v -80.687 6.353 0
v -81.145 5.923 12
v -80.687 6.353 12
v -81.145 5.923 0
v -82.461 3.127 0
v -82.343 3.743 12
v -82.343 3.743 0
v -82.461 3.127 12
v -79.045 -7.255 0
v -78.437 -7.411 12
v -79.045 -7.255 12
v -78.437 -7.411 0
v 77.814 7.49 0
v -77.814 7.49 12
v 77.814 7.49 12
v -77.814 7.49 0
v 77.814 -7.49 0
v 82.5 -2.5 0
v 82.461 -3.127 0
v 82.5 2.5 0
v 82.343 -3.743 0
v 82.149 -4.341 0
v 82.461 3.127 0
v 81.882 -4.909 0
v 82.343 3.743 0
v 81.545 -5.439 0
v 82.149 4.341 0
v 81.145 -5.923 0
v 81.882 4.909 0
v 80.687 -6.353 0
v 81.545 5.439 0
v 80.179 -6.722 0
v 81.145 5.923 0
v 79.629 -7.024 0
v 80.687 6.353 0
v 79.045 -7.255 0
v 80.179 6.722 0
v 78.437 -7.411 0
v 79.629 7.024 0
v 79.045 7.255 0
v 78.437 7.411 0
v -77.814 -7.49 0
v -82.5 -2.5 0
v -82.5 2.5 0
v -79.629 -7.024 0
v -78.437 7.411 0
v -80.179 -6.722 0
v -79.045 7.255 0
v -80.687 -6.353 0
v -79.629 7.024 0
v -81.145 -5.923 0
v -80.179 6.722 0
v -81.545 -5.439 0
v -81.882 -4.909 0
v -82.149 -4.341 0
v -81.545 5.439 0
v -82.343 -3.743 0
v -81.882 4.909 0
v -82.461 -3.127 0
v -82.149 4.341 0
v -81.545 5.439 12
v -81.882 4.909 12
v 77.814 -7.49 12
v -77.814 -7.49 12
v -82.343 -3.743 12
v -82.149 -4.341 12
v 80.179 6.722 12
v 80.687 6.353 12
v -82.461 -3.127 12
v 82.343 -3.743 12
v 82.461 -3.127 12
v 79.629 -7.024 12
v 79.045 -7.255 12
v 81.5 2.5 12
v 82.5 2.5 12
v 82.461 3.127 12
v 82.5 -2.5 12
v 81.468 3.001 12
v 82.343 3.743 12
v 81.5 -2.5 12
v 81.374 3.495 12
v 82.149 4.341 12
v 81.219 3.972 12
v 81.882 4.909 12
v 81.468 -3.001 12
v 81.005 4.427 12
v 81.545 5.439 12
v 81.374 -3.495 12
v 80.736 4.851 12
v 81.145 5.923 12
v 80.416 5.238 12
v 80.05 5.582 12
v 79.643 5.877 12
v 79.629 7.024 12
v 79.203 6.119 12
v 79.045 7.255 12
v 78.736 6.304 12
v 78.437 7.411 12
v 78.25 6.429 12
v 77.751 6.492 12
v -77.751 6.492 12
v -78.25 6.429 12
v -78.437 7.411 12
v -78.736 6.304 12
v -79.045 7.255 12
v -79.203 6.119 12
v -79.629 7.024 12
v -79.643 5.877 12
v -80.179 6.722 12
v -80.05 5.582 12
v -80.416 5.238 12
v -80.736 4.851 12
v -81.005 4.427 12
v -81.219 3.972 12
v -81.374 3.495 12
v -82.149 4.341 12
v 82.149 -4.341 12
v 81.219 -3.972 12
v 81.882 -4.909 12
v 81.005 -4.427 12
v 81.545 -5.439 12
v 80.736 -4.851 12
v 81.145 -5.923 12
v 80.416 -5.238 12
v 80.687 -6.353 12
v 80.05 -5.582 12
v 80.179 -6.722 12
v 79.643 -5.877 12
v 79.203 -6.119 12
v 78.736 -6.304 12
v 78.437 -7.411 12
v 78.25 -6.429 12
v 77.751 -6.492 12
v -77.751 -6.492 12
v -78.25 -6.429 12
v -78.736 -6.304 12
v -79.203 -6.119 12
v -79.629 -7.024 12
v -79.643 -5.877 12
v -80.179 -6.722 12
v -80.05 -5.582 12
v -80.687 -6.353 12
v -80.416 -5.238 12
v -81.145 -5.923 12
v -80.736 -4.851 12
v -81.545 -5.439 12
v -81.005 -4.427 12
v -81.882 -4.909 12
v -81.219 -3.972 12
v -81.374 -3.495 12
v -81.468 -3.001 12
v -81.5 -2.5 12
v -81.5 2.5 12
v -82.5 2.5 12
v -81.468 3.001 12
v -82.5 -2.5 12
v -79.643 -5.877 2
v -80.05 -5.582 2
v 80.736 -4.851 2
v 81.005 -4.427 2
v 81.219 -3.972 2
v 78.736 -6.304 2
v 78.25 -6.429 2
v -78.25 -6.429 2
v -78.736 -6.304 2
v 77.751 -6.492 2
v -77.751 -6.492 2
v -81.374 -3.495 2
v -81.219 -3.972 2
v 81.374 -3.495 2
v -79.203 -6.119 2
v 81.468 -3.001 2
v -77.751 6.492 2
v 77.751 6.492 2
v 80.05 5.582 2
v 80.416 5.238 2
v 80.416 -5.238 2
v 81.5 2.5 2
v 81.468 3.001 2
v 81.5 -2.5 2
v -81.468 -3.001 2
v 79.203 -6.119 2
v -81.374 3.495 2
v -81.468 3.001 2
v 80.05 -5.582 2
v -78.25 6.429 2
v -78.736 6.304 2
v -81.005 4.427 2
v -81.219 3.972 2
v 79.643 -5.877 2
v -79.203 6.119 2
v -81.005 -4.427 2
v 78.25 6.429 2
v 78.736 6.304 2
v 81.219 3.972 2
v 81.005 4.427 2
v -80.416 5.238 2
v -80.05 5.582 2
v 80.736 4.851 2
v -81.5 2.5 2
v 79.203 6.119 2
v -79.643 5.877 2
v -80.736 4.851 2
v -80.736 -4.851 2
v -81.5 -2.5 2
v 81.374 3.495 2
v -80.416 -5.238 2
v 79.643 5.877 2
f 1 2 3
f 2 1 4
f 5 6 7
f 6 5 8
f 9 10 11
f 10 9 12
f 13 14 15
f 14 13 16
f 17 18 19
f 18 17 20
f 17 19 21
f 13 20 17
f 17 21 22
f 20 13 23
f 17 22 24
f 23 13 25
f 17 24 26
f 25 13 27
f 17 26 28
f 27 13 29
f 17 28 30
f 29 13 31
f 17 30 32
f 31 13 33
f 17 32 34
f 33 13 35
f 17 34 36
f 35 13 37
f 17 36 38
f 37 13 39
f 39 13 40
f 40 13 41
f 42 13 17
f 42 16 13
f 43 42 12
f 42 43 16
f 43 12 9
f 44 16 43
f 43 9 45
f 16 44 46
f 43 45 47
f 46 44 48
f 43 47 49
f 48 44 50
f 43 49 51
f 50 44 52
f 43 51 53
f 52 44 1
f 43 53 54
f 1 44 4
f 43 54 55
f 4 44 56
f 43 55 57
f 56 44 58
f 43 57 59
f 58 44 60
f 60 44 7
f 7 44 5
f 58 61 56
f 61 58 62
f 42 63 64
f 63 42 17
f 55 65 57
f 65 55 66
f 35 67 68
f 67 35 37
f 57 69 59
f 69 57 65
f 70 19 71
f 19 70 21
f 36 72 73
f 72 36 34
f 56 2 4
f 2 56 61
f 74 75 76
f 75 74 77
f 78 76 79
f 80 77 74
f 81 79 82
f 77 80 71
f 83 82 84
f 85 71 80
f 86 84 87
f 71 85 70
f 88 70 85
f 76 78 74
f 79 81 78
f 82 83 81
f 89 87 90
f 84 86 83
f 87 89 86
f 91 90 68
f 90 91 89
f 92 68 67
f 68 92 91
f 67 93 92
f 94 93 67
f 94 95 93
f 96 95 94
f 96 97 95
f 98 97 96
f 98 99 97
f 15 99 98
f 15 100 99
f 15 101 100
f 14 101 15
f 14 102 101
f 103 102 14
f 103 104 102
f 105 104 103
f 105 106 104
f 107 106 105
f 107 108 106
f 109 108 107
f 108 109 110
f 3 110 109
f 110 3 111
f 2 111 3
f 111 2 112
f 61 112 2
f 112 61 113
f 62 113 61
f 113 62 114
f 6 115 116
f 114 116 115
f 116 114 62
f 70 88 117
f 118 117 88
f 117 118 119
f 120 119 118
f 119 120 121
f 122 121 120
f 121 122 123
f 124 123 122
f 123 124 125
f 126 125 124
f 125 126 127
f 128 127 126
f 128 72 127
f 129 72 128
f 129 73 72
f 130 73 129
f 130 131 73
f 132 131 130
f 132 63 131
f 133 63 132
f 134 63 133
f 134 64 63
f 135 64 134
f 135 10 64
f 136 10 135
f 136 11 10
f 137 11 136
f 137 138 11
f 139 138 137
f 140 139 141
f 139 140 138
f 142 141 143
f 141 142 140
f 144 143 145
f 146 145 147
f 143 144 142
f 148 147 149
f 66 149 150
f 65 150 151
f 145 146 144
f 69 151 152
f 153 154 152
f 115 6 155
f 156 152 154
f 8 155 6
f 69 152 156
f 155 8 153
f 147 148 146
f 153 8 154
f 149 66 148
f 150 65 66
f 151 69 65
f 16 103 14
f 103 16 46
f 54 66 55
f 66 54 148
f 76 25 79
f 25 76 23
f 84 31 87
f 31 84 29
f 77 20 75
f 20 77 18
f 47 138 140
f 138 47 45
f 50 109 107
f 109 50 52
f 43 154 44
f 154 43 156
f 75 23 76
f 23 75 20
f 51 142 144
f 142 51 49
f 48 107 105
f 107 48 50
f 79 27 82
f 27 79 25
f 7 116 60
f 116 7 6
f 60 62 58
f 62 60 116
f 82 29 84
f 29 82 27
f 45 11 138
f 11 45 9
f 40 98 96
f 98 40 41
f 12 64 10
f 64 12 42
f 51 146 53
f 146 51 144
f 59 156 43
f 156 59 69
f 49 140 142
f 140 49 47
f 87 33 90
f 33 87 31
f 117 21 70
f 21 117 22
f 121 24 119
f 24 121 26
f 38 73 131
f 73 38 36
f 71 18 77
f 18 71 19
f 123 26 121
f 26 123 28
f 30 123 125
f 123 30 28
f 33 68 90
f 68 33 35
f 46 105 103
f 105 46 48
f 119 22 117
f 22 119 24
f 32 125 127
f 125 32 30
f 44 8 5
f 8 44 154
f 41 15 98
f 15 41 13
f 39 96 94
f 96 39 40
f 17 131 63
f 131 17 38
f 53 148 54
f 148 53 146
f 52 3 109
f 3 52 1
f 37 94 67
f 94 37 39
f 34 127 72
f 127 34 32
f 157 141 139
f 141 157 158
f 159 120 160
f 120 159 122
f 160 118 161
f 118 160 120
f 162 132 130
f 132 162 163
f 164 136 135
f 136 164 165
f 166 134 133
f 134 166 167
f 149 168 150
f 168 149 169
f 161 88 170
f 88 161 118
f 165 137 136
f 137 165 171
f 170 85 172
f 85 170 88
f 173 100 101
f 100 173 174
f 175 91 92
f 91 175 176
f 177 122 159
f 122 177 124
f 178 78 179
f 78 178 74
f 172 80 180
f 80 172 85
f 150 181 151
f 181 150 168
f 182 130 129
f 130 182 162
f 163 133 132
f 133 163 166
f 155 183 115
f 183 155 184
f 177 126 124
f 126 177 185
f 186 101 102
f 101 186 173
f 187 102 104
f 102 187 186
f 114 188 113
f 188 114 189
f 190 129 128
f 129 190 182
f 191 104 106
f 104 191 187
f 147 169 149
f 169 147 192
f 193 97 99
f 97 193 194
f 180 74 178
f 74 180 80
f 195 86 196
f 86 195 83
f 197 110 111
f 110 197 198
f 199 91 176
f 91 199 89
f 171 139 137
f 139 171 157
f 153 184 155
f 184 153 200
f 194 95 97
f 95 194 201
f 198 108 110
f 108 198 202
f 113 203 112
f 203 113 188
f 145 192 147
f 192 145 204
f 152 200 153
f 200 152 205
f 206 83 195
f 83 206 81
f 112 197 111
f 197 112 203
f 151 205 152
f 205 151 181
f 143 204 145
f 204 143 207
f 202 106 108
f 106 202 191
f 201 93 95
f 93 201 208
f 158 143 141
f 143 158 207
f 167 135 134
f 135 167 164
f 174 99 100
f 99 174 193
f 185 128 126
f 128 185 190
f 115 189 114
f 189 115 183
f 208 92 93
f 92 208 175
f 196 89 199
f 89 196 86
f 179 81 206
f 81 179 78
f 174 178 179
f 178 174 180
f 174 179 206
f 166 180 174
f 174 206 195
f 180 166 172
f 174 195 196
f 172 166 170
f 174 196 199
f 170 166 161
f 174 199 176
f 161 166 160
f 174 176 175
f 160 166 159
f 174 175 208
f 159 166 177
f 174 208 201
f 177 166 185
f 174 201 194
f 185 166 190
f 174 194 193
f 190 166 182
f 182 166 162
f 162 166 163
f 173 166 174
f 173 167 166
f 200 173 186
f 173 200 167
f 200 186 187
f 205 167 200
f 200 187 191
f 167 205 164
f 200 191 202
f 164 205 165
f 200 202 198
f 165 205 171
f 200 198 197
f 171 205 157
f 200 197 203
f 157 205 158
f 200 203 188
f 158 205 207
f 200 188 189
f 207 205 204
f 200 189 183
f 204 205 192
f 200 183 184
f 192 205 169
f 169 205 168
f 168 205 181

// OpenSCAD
$fn = 50;


difference() {
	union() {
		hull() {
			translate(v = [-77.5000000000, 2.5000000000, 0]) {
				cylinder(h = 12, r = 5);
			}
			translate(v = [77.5000000000, 2.5000000000, 0]) {
				cylinder(h = 12, r = 5);
			}
			translate(v = [-77.5000000000, -2.5000000000, 0]) {
				cylinder(h = 12, r = 5);
			}
			translate(v = [77.5000000000, -2.5000000000, 0]) {
				cylinder(h = 12, r = 5);
			}
		}
	}
	union() {
		translate(v = [0, 0, 2]) {
			hull() {
				translate(v = [-77.5000000000, 2.5000000000, 0]) {
					cylinder(h = 10, r = 4);
				}
				translate(v = [77.5000000000, 2.5000000000, 0]) {
					cylinder(h = 10, r = 4);
				}
				translate(v = [-77.5000000000, -2.5000000000, 0]) {
					cylinder(h = 10, r = 4);
				}
				translate(v = [77.5000000000, -2.5000000000, 0]) {
					cylinder(h = 10, r = 4);
				}
			}
		}
	}
}
